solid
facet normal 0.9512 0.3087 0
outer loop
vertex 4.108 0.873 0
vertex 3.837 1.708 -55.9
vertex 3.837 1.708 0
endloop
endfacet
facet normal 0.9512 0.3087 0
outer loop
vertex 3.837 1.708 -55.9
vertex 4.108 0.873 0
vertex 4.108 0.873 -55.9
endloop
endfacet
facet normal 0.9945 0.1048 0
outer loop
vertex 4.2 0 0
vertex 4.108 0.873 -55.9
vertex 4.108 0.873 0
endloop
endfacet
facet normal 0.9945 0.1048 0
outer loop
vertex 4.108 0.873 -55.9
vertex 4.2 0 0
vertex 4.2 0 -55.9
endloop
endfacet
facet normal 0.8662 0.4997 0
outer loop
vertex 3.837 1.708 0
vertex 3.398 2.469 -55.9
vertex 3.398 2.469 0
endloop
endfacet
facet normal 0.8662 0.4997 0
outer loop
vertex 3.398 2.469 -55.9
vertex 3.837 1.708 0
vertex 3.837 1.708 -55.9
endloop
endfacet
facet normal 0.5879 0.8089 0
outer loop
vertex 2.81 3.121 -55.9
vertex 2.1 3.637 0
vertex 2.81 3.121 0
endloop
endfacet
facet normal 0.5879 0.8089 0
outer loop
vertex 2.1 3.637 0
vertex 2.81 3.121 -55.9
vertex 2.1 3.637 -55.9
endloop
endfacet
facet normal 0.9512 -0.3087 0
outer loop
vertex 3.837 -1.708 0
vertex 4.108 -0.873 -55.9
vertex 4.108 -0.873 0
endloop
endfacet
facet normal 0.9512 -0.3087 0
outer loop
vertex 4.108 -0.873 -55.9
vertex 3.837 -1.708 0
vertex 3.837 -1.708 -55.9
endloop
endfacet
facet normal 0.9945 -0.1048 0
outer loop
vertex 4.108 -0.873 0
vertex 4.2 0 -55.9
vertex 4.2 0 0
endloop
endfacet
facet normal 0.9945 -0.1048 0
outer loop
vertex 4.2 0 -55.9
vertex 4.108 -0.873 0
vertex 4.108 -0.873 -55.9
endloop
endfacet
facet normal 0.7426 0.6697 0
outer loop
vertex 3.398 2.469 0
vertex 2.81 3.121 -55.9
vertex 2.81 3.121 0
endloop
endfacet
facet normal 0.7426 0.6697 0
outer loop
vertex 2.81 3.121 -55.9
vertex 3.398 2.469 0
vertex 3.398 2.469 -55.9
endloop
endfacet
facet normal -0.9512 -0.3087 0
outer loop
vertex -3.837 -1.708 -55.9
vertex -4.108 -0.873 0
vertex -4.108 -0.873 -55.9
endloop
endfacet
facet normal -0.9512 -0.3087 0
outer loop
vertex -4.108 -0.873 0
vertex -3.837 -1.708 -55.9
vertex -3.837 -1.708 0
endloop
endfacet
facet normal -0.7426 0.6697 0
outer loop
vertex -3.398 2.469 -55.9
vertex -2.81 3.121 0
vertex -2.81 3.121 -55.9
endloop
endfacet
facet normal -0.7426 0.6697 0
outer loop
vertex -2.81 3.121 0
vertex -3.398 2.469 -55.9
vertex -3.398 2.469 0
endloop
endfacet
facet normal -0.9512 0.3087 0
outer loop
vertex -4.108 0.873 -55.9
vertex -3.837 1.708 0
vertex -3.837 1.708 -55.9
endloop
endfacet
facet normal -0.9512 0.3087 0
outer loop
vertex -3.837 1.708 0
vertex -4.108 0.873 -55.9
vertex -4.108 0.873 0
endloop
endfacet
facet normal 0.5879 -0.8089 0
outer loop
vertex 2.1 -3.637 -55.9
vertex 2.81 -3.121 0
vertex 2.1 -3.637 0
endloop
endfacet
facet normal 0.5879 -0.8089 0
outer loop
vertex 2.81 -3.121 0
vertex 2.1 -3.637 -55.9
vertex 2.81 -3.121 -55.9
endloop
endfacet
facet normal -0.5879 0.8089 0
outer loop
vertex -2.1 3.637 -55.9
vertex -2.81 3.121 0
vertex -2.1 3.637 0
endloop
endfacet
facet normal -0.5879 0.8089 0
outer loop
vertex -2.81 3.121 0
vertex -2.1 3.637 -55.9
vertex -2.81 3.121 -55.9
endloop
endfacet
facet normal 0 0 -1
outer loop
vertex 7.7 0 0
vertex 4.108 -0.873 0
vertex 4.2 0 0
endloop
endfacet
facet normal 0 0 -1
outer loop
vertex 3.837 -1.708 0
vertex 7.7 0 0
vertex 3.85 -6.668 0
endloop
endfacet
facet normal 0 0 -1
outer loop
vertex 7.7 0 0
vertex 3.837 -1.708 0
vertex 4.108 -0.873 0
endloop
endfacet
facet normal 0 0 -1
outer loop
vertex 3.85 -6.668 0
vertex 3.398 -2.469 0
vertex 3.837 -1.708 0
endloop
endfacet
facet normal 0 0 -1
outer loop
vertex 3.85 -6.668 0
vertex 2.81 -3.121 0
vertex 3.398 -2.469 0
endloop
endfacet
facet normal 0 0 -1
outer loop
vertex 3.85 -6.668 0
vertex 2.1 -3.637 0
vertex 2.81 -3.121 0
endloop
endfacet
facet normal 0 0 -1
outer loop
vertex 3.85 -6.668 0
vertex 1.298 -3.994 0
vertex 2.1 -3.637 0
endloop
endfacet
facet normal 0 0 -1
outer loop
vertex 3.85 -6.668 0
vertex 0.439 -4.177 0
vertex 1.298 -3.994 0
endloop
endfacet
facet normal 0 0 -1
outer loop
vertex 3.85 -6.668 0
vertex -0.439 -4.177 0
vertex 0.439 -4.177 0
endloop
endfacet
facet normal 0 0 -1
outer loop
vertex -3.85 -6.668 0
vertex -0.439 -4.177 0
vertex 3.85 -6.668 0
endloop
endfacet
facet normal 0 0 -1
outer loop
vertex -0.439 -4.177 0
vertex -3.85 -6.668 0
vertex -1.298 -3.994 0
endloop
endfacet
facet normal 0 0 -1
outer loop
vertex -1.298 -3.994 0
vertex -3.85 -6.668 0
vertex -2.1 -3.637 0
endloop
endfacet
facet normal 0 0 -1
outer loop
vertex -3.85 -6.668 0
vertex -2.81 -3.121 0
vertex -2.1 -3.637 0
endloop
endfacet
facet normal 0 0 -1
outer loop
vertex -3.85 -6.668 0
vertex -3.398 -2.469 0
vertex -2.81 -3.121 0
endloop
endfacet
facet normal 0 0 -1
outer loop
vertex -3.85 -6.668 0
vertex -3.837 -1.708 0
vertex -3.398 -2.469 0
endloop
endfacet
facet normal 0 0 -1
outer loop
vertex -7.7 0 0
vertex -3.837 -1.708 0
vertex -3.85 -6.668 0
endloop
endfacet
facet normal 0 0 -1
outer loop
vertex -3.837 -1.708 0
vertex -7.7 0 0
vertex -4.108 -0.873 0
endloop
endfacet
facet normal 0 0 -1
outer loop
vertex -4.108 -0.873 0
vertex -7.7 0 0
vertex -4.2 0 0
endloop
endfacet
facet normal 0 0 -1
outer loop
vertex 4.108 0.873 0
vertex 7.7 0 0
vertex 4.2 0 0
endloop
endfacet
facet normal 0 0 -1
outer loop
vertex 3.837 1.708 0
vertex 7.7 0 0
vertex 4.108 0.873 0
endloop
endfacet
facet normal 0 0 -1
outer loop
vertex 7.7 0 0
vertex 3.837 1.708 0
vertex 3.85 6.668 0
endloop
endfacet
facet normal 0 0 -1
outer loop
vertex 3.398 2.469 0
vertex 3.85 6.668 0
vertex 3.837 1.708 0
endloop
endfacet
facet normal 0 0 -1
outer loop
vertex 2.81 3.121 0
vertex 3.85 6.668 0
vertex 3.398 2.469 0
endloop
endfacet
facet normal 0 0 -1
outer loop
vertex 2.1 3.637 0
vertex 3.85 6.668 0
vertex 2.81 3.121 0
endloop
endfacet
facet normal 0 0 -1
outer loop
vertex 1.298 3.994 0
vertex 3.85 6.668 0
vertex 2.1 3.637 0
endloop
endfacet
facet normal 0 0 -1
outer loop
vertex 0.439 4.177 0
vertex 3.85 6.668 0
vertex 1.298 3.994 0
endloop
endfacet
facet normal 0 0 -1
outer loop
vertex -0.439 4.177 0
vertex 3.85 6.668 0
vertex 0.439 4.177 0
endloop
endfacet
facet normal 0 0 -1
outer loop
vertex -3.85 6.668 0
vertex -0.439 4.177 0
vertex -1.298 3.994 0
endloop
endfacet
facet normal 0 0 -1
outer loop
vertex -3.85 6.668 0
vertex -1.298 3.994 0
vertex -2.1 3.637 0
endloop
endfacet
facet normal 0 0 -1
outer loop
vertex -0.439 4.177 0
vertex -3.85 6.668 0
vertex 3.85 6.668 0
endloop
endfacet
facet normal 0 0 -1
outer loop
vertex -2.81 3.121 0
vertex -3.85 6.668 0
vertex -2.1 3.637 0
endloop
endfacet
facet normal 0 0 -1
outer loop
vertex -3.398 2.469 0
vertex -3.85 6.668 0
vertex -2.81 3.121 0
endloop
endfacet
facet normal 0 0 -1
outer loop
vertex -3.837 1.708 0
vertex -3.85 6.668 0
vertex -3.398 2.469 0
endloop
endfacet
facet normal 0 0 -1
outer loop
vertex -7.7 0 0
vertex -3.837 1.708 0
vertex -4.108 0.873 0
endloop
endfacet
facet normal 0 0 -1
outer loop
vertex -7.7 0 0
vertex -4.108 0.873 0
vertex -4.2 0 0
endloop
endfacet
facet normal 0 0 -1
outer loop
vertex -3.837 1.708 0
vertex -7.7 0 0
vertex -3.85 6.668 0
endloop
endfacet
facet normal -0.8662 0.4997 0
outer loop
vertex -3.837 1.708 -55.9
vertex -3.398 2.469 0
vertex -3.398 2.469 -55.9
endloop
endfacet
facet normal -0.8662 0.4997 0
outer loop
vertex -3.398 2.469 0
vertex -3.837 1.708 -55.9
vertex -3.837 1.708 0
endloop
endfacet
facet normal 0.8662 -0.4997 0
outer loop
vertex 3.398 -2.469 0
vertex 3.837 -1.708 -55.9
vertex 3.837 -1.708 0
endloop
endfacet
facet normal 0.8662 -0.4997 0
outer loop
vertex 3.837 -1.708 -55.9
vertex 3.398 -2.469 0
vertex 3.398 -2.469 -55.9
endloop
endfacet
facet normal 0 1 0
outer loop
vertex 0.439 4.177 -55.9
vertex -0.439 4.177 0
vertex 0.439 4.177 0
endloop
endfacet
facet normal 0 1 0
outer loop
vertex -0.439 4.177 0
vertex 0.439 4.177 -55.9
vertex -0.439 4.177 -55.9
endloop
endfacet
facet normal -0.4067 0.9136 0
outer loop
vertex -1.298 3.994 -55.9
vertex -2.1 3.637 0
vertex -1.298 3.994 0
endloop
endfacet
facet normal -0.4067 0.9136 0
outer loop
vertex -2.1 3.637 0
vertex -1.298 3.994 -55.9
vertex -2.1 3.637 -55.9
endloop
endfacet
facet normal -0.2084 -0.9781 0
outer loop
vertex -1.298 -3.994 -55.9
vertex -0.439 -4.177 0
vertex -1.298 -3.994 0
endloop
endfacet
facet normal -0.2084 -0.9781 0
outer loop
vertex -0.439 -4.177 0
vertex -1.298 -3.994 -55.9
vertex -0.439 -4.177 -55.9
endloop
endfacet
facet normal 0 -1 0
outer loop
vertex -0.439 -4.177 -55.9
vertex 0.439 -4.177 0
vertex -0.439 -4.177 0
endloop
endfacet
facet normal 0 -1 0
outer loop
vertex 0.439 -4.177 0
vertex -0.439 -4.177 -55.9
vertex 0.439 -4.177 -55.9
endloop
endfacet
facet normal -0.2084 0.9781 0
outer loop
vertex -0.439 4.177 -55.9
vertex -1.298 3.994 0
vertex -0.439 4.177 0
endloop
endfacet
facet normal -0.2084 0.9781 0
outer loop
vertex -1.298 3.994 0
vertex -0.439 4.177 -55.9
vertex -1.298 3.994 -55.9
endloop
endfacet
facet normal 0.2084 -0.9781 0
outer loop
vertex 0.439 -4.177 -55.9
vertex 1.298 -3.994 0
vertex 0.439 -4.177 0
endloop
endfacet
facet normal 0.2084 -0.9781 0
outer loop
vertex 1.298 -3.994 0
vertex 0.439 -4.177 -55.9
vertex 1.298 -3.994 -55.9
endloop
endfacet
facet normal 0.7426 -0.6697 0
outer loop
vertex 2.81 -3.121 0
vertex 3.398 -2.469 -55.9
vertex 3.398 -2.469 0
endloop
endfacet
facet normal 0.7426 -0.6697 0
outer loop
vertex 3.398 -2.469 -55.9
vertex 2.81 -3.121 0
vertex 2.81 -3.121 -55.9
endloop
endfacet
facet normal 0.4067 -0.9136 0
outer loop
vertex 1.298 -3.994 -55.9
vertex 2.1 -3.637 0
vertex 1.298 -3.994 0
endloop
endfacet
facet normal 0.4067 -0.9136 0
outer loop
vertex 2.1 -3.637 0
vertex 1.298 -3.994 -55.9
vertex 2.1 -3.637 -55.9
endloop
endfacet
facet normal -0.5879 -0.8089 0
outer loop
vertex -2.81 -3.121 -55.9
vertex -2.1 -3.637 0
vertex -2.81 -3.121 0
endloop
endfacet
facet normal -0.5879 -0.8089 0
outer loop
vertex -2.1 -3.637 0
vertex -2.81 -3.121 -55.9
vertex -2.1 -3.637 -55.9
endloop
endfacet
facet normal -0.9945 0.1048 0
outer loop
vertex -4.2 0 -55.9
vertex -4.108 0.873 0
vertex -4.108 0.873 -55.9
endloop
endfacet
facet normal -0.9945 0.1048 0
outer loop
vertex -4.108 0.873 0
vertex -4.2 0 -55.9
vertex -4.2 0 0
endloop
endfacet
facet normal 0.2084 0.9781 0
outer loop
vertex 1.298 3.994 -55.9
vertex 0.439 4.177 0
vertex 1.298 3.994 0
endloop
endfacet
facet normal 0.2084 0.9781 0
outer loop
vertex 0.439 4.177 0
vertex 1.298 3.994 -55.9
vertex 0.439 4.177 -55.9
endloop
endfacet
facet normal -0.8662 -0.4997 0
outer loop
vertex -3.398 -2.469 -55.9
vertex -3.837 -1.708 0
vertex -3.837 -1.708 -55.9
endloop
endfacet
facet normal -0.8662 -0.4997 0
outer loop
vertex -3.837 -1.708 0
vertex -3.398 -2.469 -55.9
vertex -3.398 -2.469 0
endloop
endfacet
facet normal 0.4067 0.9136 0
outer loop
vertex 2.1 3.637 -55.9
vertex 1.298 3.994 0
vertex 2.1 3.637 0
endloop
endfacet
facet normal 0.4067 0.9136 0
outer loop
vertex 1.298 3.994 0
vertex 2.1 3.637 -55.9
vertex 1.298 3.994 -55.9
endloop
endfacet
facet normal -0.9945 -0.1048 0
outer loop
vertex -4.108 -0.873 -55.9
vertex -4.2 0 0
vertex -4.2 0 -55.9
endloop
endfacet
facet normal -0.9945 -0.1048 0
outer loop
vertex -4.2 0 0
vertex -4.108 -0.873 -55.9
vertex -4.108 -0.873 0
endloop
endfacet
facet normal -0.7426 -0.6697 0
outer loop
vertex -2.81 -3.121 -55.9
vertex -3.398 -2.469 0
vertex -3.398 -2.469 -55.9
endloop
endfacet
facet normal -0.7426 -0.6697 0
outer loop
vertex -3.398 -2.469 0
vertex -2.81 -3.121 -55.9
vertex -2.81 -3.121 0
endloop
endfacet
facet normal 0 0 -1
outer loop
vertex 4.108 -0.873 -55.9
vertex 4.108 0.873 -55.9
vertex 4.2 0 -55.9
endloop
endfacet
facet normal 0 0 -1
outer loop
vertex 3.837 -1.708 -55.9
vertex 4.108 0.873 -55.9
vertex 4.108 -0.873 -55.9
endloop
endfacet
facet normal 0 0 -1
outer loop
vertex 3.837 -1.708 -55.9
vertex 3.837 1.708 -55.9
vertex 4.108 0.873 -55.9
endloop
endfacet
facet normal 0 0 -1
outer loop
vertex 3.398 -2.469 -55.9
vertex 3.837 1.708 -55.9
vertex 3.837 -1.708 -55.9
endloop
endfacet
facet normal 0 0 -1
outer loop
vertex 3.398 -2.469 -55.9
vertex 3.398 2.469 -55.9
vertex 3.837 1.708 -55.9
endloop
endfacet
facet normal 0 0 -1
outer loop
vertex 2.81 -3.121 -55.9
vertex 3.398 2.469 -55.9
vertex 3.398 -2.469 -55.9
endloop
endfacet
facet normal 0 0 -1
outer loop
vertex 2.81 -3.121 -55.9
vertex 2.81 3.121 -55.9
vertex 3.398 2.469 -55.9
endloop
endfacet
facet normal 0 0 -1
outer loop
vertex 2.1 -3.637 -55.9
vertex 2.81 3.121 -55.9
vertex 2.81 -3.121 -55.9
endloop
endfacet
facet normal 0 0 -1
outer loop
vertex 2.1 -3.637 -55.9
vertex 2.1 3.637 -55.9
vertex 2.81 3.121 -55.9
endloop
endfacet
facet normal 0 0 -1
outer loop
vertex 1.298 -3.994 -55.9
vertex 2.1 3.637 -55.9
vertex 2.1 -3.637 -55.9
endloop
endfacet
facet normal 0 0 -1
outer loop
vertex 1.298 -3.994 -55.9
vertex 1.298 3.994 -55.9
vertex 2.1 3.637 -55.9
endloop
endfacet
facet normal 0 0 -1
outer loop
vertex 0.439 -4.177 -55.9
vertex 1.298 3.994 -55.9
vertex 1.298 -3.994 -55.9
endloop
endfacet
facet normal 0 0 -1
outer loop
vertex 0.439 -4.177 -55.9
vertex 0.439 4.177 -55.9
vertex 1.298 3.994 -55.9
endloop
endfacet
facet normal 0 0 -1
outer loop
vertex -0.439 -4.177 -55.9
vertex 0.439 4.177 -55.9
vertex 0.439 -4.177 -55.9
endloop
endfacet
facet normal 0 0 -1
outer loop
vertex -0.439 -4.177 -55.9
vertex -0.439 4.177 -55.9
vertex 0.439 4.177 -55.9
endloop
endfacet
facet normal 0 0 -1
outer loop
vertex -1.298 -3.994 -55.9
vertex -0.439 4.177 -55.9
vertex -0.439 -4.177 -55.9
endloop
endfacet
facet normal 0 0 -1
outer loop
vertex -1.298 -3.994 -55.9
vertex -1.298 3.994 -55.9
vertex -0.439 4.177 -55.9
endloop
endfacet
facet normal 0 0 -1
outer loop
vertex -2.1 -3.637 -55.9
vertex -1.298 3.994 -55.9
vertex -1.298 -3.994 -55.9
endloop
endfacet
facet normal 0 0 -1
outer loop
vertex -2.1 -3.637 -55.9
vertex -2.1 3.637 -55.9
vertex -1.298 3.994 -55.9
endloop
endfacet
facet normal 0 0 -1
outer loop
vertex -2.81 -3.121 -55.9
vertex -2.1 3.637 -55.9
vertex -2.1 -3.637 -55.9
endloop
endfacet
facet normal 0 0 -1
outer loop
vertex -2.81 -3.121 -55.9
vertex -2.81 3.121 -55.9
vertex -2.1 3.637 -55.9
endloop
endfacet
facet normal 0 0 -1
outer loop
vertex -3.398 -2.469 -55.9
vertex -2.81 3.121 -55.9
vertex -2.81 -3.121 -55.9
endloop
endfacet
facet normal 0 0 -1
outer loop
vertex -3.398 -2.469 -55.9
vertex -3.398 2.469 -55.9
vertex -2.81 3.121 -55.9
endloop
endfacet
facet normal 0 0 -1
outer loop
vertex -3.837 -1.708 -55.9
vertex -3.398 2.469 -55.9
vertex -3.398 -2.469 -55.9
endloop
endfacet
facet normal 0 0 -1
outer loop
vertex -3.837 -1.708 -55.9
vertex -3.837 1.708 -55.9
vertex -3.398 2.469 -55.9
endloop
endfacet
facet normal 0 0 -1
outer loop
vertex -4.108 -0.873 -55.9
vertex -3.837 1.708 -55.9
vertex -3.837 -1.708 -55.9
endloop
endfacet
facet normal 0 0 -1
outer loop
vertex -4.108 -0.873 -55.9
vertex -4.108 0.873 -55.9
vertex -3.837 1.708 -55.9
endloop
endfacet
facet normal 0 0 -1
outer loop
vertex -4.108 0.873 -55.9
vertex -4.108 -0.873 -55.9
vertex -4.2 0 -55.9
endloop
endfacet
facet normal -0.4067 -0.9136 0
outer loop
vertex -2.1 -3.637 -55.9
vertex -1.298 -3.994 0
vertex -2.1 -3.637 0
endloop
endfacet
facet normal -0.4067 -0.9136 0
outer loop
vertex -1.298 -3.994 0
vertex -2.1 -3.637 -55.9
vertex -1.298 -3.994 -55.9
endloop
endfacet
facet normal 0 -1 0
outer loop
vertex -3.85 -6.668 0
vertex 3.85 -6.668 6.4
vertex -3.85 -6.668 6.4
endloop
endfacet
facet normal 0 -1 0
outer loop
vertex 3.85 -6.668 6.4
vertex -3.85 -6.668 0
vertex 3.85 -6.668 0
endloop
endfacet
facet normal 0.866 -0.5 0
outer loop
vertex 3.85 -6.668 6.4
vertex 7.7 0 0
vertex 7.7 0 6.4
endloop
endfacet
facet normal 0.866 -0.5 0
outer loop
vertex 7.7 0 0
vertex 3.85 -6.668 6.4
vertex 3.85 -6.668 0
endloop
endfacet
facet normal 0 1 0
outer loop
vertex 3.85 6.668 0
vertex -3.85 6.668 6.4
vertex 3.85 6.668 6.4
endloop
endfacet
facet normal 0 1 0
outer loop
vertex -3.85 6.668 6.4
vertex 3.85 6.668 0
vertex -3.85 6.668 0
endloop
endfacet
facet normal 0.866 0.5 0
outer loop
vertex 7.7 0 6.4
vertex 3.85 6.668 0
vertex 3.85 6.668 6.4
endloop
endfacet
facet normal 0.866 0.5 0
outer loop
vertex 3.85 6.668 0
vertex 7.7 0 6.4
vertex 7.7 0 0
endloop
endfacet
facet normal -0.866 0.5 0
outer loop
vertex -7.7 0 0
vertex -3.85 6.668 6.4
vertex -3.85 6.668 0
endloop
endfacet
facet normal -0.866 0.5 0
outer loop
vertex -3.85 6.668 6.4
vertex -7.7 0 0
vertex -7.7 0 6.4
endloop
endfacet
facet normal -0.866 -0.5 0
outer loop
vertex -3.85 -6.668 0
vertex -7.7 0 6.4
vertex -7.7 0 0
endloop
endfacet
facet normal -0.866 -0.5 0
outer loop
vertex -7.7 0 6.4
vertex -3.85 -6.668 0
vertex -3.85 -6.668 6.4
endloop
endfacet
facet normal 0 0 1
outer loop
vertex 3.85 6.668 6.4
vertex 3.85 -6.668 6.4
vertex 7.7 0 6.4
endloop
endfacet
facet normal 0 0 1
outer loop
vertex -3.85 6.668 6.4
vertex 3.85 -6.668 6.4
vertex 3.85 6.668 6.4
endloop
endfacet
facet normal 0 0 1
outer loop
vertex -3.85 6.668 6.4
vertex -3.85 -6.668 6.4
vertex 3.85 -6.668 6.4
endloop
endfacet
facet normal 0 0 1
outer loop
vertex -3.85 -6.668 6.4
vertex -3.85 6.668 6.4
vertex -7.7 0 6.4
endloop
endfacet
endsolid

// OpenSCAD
function M8x50BoltDiameter(3dPrinterTolerance=.4)= 8+3dPrinterTolerance;
function M8x50BoltLength(3dPrinterTolerance=.4)= 55.5+3dPrinterTolerance;
function M8x50BoltHeadDiameter(3dPrinterTolerance=.4)= 15+3dPrinterTolerance;
function M8x50BoltHeadHeight(3dPrinterTolerance=.4)= 6+3dPrinterTolerance;

//err on the side of larger tolerances for bolts

module M8x50Bolt(3dPrinterTolerance=.4)
{
	union()
	{
		translate([0,0,-M8x50BoltLength(3dPrinterTolerance)])
		{
			cylinder(h=M8x50BoltLength(3dPrinterTolerance),r=M8x50BoltDiameter(3dPrinterTolerance)/2, $fn=30);
		}
		cylinder(h=M8x50BoltHeadHeight(3dPrinterTolerance),r=M8x50BoltHeadDiameter(3dPrinterTolerance)/2, $fn=6);
	}
}

M8x50Bolt();
